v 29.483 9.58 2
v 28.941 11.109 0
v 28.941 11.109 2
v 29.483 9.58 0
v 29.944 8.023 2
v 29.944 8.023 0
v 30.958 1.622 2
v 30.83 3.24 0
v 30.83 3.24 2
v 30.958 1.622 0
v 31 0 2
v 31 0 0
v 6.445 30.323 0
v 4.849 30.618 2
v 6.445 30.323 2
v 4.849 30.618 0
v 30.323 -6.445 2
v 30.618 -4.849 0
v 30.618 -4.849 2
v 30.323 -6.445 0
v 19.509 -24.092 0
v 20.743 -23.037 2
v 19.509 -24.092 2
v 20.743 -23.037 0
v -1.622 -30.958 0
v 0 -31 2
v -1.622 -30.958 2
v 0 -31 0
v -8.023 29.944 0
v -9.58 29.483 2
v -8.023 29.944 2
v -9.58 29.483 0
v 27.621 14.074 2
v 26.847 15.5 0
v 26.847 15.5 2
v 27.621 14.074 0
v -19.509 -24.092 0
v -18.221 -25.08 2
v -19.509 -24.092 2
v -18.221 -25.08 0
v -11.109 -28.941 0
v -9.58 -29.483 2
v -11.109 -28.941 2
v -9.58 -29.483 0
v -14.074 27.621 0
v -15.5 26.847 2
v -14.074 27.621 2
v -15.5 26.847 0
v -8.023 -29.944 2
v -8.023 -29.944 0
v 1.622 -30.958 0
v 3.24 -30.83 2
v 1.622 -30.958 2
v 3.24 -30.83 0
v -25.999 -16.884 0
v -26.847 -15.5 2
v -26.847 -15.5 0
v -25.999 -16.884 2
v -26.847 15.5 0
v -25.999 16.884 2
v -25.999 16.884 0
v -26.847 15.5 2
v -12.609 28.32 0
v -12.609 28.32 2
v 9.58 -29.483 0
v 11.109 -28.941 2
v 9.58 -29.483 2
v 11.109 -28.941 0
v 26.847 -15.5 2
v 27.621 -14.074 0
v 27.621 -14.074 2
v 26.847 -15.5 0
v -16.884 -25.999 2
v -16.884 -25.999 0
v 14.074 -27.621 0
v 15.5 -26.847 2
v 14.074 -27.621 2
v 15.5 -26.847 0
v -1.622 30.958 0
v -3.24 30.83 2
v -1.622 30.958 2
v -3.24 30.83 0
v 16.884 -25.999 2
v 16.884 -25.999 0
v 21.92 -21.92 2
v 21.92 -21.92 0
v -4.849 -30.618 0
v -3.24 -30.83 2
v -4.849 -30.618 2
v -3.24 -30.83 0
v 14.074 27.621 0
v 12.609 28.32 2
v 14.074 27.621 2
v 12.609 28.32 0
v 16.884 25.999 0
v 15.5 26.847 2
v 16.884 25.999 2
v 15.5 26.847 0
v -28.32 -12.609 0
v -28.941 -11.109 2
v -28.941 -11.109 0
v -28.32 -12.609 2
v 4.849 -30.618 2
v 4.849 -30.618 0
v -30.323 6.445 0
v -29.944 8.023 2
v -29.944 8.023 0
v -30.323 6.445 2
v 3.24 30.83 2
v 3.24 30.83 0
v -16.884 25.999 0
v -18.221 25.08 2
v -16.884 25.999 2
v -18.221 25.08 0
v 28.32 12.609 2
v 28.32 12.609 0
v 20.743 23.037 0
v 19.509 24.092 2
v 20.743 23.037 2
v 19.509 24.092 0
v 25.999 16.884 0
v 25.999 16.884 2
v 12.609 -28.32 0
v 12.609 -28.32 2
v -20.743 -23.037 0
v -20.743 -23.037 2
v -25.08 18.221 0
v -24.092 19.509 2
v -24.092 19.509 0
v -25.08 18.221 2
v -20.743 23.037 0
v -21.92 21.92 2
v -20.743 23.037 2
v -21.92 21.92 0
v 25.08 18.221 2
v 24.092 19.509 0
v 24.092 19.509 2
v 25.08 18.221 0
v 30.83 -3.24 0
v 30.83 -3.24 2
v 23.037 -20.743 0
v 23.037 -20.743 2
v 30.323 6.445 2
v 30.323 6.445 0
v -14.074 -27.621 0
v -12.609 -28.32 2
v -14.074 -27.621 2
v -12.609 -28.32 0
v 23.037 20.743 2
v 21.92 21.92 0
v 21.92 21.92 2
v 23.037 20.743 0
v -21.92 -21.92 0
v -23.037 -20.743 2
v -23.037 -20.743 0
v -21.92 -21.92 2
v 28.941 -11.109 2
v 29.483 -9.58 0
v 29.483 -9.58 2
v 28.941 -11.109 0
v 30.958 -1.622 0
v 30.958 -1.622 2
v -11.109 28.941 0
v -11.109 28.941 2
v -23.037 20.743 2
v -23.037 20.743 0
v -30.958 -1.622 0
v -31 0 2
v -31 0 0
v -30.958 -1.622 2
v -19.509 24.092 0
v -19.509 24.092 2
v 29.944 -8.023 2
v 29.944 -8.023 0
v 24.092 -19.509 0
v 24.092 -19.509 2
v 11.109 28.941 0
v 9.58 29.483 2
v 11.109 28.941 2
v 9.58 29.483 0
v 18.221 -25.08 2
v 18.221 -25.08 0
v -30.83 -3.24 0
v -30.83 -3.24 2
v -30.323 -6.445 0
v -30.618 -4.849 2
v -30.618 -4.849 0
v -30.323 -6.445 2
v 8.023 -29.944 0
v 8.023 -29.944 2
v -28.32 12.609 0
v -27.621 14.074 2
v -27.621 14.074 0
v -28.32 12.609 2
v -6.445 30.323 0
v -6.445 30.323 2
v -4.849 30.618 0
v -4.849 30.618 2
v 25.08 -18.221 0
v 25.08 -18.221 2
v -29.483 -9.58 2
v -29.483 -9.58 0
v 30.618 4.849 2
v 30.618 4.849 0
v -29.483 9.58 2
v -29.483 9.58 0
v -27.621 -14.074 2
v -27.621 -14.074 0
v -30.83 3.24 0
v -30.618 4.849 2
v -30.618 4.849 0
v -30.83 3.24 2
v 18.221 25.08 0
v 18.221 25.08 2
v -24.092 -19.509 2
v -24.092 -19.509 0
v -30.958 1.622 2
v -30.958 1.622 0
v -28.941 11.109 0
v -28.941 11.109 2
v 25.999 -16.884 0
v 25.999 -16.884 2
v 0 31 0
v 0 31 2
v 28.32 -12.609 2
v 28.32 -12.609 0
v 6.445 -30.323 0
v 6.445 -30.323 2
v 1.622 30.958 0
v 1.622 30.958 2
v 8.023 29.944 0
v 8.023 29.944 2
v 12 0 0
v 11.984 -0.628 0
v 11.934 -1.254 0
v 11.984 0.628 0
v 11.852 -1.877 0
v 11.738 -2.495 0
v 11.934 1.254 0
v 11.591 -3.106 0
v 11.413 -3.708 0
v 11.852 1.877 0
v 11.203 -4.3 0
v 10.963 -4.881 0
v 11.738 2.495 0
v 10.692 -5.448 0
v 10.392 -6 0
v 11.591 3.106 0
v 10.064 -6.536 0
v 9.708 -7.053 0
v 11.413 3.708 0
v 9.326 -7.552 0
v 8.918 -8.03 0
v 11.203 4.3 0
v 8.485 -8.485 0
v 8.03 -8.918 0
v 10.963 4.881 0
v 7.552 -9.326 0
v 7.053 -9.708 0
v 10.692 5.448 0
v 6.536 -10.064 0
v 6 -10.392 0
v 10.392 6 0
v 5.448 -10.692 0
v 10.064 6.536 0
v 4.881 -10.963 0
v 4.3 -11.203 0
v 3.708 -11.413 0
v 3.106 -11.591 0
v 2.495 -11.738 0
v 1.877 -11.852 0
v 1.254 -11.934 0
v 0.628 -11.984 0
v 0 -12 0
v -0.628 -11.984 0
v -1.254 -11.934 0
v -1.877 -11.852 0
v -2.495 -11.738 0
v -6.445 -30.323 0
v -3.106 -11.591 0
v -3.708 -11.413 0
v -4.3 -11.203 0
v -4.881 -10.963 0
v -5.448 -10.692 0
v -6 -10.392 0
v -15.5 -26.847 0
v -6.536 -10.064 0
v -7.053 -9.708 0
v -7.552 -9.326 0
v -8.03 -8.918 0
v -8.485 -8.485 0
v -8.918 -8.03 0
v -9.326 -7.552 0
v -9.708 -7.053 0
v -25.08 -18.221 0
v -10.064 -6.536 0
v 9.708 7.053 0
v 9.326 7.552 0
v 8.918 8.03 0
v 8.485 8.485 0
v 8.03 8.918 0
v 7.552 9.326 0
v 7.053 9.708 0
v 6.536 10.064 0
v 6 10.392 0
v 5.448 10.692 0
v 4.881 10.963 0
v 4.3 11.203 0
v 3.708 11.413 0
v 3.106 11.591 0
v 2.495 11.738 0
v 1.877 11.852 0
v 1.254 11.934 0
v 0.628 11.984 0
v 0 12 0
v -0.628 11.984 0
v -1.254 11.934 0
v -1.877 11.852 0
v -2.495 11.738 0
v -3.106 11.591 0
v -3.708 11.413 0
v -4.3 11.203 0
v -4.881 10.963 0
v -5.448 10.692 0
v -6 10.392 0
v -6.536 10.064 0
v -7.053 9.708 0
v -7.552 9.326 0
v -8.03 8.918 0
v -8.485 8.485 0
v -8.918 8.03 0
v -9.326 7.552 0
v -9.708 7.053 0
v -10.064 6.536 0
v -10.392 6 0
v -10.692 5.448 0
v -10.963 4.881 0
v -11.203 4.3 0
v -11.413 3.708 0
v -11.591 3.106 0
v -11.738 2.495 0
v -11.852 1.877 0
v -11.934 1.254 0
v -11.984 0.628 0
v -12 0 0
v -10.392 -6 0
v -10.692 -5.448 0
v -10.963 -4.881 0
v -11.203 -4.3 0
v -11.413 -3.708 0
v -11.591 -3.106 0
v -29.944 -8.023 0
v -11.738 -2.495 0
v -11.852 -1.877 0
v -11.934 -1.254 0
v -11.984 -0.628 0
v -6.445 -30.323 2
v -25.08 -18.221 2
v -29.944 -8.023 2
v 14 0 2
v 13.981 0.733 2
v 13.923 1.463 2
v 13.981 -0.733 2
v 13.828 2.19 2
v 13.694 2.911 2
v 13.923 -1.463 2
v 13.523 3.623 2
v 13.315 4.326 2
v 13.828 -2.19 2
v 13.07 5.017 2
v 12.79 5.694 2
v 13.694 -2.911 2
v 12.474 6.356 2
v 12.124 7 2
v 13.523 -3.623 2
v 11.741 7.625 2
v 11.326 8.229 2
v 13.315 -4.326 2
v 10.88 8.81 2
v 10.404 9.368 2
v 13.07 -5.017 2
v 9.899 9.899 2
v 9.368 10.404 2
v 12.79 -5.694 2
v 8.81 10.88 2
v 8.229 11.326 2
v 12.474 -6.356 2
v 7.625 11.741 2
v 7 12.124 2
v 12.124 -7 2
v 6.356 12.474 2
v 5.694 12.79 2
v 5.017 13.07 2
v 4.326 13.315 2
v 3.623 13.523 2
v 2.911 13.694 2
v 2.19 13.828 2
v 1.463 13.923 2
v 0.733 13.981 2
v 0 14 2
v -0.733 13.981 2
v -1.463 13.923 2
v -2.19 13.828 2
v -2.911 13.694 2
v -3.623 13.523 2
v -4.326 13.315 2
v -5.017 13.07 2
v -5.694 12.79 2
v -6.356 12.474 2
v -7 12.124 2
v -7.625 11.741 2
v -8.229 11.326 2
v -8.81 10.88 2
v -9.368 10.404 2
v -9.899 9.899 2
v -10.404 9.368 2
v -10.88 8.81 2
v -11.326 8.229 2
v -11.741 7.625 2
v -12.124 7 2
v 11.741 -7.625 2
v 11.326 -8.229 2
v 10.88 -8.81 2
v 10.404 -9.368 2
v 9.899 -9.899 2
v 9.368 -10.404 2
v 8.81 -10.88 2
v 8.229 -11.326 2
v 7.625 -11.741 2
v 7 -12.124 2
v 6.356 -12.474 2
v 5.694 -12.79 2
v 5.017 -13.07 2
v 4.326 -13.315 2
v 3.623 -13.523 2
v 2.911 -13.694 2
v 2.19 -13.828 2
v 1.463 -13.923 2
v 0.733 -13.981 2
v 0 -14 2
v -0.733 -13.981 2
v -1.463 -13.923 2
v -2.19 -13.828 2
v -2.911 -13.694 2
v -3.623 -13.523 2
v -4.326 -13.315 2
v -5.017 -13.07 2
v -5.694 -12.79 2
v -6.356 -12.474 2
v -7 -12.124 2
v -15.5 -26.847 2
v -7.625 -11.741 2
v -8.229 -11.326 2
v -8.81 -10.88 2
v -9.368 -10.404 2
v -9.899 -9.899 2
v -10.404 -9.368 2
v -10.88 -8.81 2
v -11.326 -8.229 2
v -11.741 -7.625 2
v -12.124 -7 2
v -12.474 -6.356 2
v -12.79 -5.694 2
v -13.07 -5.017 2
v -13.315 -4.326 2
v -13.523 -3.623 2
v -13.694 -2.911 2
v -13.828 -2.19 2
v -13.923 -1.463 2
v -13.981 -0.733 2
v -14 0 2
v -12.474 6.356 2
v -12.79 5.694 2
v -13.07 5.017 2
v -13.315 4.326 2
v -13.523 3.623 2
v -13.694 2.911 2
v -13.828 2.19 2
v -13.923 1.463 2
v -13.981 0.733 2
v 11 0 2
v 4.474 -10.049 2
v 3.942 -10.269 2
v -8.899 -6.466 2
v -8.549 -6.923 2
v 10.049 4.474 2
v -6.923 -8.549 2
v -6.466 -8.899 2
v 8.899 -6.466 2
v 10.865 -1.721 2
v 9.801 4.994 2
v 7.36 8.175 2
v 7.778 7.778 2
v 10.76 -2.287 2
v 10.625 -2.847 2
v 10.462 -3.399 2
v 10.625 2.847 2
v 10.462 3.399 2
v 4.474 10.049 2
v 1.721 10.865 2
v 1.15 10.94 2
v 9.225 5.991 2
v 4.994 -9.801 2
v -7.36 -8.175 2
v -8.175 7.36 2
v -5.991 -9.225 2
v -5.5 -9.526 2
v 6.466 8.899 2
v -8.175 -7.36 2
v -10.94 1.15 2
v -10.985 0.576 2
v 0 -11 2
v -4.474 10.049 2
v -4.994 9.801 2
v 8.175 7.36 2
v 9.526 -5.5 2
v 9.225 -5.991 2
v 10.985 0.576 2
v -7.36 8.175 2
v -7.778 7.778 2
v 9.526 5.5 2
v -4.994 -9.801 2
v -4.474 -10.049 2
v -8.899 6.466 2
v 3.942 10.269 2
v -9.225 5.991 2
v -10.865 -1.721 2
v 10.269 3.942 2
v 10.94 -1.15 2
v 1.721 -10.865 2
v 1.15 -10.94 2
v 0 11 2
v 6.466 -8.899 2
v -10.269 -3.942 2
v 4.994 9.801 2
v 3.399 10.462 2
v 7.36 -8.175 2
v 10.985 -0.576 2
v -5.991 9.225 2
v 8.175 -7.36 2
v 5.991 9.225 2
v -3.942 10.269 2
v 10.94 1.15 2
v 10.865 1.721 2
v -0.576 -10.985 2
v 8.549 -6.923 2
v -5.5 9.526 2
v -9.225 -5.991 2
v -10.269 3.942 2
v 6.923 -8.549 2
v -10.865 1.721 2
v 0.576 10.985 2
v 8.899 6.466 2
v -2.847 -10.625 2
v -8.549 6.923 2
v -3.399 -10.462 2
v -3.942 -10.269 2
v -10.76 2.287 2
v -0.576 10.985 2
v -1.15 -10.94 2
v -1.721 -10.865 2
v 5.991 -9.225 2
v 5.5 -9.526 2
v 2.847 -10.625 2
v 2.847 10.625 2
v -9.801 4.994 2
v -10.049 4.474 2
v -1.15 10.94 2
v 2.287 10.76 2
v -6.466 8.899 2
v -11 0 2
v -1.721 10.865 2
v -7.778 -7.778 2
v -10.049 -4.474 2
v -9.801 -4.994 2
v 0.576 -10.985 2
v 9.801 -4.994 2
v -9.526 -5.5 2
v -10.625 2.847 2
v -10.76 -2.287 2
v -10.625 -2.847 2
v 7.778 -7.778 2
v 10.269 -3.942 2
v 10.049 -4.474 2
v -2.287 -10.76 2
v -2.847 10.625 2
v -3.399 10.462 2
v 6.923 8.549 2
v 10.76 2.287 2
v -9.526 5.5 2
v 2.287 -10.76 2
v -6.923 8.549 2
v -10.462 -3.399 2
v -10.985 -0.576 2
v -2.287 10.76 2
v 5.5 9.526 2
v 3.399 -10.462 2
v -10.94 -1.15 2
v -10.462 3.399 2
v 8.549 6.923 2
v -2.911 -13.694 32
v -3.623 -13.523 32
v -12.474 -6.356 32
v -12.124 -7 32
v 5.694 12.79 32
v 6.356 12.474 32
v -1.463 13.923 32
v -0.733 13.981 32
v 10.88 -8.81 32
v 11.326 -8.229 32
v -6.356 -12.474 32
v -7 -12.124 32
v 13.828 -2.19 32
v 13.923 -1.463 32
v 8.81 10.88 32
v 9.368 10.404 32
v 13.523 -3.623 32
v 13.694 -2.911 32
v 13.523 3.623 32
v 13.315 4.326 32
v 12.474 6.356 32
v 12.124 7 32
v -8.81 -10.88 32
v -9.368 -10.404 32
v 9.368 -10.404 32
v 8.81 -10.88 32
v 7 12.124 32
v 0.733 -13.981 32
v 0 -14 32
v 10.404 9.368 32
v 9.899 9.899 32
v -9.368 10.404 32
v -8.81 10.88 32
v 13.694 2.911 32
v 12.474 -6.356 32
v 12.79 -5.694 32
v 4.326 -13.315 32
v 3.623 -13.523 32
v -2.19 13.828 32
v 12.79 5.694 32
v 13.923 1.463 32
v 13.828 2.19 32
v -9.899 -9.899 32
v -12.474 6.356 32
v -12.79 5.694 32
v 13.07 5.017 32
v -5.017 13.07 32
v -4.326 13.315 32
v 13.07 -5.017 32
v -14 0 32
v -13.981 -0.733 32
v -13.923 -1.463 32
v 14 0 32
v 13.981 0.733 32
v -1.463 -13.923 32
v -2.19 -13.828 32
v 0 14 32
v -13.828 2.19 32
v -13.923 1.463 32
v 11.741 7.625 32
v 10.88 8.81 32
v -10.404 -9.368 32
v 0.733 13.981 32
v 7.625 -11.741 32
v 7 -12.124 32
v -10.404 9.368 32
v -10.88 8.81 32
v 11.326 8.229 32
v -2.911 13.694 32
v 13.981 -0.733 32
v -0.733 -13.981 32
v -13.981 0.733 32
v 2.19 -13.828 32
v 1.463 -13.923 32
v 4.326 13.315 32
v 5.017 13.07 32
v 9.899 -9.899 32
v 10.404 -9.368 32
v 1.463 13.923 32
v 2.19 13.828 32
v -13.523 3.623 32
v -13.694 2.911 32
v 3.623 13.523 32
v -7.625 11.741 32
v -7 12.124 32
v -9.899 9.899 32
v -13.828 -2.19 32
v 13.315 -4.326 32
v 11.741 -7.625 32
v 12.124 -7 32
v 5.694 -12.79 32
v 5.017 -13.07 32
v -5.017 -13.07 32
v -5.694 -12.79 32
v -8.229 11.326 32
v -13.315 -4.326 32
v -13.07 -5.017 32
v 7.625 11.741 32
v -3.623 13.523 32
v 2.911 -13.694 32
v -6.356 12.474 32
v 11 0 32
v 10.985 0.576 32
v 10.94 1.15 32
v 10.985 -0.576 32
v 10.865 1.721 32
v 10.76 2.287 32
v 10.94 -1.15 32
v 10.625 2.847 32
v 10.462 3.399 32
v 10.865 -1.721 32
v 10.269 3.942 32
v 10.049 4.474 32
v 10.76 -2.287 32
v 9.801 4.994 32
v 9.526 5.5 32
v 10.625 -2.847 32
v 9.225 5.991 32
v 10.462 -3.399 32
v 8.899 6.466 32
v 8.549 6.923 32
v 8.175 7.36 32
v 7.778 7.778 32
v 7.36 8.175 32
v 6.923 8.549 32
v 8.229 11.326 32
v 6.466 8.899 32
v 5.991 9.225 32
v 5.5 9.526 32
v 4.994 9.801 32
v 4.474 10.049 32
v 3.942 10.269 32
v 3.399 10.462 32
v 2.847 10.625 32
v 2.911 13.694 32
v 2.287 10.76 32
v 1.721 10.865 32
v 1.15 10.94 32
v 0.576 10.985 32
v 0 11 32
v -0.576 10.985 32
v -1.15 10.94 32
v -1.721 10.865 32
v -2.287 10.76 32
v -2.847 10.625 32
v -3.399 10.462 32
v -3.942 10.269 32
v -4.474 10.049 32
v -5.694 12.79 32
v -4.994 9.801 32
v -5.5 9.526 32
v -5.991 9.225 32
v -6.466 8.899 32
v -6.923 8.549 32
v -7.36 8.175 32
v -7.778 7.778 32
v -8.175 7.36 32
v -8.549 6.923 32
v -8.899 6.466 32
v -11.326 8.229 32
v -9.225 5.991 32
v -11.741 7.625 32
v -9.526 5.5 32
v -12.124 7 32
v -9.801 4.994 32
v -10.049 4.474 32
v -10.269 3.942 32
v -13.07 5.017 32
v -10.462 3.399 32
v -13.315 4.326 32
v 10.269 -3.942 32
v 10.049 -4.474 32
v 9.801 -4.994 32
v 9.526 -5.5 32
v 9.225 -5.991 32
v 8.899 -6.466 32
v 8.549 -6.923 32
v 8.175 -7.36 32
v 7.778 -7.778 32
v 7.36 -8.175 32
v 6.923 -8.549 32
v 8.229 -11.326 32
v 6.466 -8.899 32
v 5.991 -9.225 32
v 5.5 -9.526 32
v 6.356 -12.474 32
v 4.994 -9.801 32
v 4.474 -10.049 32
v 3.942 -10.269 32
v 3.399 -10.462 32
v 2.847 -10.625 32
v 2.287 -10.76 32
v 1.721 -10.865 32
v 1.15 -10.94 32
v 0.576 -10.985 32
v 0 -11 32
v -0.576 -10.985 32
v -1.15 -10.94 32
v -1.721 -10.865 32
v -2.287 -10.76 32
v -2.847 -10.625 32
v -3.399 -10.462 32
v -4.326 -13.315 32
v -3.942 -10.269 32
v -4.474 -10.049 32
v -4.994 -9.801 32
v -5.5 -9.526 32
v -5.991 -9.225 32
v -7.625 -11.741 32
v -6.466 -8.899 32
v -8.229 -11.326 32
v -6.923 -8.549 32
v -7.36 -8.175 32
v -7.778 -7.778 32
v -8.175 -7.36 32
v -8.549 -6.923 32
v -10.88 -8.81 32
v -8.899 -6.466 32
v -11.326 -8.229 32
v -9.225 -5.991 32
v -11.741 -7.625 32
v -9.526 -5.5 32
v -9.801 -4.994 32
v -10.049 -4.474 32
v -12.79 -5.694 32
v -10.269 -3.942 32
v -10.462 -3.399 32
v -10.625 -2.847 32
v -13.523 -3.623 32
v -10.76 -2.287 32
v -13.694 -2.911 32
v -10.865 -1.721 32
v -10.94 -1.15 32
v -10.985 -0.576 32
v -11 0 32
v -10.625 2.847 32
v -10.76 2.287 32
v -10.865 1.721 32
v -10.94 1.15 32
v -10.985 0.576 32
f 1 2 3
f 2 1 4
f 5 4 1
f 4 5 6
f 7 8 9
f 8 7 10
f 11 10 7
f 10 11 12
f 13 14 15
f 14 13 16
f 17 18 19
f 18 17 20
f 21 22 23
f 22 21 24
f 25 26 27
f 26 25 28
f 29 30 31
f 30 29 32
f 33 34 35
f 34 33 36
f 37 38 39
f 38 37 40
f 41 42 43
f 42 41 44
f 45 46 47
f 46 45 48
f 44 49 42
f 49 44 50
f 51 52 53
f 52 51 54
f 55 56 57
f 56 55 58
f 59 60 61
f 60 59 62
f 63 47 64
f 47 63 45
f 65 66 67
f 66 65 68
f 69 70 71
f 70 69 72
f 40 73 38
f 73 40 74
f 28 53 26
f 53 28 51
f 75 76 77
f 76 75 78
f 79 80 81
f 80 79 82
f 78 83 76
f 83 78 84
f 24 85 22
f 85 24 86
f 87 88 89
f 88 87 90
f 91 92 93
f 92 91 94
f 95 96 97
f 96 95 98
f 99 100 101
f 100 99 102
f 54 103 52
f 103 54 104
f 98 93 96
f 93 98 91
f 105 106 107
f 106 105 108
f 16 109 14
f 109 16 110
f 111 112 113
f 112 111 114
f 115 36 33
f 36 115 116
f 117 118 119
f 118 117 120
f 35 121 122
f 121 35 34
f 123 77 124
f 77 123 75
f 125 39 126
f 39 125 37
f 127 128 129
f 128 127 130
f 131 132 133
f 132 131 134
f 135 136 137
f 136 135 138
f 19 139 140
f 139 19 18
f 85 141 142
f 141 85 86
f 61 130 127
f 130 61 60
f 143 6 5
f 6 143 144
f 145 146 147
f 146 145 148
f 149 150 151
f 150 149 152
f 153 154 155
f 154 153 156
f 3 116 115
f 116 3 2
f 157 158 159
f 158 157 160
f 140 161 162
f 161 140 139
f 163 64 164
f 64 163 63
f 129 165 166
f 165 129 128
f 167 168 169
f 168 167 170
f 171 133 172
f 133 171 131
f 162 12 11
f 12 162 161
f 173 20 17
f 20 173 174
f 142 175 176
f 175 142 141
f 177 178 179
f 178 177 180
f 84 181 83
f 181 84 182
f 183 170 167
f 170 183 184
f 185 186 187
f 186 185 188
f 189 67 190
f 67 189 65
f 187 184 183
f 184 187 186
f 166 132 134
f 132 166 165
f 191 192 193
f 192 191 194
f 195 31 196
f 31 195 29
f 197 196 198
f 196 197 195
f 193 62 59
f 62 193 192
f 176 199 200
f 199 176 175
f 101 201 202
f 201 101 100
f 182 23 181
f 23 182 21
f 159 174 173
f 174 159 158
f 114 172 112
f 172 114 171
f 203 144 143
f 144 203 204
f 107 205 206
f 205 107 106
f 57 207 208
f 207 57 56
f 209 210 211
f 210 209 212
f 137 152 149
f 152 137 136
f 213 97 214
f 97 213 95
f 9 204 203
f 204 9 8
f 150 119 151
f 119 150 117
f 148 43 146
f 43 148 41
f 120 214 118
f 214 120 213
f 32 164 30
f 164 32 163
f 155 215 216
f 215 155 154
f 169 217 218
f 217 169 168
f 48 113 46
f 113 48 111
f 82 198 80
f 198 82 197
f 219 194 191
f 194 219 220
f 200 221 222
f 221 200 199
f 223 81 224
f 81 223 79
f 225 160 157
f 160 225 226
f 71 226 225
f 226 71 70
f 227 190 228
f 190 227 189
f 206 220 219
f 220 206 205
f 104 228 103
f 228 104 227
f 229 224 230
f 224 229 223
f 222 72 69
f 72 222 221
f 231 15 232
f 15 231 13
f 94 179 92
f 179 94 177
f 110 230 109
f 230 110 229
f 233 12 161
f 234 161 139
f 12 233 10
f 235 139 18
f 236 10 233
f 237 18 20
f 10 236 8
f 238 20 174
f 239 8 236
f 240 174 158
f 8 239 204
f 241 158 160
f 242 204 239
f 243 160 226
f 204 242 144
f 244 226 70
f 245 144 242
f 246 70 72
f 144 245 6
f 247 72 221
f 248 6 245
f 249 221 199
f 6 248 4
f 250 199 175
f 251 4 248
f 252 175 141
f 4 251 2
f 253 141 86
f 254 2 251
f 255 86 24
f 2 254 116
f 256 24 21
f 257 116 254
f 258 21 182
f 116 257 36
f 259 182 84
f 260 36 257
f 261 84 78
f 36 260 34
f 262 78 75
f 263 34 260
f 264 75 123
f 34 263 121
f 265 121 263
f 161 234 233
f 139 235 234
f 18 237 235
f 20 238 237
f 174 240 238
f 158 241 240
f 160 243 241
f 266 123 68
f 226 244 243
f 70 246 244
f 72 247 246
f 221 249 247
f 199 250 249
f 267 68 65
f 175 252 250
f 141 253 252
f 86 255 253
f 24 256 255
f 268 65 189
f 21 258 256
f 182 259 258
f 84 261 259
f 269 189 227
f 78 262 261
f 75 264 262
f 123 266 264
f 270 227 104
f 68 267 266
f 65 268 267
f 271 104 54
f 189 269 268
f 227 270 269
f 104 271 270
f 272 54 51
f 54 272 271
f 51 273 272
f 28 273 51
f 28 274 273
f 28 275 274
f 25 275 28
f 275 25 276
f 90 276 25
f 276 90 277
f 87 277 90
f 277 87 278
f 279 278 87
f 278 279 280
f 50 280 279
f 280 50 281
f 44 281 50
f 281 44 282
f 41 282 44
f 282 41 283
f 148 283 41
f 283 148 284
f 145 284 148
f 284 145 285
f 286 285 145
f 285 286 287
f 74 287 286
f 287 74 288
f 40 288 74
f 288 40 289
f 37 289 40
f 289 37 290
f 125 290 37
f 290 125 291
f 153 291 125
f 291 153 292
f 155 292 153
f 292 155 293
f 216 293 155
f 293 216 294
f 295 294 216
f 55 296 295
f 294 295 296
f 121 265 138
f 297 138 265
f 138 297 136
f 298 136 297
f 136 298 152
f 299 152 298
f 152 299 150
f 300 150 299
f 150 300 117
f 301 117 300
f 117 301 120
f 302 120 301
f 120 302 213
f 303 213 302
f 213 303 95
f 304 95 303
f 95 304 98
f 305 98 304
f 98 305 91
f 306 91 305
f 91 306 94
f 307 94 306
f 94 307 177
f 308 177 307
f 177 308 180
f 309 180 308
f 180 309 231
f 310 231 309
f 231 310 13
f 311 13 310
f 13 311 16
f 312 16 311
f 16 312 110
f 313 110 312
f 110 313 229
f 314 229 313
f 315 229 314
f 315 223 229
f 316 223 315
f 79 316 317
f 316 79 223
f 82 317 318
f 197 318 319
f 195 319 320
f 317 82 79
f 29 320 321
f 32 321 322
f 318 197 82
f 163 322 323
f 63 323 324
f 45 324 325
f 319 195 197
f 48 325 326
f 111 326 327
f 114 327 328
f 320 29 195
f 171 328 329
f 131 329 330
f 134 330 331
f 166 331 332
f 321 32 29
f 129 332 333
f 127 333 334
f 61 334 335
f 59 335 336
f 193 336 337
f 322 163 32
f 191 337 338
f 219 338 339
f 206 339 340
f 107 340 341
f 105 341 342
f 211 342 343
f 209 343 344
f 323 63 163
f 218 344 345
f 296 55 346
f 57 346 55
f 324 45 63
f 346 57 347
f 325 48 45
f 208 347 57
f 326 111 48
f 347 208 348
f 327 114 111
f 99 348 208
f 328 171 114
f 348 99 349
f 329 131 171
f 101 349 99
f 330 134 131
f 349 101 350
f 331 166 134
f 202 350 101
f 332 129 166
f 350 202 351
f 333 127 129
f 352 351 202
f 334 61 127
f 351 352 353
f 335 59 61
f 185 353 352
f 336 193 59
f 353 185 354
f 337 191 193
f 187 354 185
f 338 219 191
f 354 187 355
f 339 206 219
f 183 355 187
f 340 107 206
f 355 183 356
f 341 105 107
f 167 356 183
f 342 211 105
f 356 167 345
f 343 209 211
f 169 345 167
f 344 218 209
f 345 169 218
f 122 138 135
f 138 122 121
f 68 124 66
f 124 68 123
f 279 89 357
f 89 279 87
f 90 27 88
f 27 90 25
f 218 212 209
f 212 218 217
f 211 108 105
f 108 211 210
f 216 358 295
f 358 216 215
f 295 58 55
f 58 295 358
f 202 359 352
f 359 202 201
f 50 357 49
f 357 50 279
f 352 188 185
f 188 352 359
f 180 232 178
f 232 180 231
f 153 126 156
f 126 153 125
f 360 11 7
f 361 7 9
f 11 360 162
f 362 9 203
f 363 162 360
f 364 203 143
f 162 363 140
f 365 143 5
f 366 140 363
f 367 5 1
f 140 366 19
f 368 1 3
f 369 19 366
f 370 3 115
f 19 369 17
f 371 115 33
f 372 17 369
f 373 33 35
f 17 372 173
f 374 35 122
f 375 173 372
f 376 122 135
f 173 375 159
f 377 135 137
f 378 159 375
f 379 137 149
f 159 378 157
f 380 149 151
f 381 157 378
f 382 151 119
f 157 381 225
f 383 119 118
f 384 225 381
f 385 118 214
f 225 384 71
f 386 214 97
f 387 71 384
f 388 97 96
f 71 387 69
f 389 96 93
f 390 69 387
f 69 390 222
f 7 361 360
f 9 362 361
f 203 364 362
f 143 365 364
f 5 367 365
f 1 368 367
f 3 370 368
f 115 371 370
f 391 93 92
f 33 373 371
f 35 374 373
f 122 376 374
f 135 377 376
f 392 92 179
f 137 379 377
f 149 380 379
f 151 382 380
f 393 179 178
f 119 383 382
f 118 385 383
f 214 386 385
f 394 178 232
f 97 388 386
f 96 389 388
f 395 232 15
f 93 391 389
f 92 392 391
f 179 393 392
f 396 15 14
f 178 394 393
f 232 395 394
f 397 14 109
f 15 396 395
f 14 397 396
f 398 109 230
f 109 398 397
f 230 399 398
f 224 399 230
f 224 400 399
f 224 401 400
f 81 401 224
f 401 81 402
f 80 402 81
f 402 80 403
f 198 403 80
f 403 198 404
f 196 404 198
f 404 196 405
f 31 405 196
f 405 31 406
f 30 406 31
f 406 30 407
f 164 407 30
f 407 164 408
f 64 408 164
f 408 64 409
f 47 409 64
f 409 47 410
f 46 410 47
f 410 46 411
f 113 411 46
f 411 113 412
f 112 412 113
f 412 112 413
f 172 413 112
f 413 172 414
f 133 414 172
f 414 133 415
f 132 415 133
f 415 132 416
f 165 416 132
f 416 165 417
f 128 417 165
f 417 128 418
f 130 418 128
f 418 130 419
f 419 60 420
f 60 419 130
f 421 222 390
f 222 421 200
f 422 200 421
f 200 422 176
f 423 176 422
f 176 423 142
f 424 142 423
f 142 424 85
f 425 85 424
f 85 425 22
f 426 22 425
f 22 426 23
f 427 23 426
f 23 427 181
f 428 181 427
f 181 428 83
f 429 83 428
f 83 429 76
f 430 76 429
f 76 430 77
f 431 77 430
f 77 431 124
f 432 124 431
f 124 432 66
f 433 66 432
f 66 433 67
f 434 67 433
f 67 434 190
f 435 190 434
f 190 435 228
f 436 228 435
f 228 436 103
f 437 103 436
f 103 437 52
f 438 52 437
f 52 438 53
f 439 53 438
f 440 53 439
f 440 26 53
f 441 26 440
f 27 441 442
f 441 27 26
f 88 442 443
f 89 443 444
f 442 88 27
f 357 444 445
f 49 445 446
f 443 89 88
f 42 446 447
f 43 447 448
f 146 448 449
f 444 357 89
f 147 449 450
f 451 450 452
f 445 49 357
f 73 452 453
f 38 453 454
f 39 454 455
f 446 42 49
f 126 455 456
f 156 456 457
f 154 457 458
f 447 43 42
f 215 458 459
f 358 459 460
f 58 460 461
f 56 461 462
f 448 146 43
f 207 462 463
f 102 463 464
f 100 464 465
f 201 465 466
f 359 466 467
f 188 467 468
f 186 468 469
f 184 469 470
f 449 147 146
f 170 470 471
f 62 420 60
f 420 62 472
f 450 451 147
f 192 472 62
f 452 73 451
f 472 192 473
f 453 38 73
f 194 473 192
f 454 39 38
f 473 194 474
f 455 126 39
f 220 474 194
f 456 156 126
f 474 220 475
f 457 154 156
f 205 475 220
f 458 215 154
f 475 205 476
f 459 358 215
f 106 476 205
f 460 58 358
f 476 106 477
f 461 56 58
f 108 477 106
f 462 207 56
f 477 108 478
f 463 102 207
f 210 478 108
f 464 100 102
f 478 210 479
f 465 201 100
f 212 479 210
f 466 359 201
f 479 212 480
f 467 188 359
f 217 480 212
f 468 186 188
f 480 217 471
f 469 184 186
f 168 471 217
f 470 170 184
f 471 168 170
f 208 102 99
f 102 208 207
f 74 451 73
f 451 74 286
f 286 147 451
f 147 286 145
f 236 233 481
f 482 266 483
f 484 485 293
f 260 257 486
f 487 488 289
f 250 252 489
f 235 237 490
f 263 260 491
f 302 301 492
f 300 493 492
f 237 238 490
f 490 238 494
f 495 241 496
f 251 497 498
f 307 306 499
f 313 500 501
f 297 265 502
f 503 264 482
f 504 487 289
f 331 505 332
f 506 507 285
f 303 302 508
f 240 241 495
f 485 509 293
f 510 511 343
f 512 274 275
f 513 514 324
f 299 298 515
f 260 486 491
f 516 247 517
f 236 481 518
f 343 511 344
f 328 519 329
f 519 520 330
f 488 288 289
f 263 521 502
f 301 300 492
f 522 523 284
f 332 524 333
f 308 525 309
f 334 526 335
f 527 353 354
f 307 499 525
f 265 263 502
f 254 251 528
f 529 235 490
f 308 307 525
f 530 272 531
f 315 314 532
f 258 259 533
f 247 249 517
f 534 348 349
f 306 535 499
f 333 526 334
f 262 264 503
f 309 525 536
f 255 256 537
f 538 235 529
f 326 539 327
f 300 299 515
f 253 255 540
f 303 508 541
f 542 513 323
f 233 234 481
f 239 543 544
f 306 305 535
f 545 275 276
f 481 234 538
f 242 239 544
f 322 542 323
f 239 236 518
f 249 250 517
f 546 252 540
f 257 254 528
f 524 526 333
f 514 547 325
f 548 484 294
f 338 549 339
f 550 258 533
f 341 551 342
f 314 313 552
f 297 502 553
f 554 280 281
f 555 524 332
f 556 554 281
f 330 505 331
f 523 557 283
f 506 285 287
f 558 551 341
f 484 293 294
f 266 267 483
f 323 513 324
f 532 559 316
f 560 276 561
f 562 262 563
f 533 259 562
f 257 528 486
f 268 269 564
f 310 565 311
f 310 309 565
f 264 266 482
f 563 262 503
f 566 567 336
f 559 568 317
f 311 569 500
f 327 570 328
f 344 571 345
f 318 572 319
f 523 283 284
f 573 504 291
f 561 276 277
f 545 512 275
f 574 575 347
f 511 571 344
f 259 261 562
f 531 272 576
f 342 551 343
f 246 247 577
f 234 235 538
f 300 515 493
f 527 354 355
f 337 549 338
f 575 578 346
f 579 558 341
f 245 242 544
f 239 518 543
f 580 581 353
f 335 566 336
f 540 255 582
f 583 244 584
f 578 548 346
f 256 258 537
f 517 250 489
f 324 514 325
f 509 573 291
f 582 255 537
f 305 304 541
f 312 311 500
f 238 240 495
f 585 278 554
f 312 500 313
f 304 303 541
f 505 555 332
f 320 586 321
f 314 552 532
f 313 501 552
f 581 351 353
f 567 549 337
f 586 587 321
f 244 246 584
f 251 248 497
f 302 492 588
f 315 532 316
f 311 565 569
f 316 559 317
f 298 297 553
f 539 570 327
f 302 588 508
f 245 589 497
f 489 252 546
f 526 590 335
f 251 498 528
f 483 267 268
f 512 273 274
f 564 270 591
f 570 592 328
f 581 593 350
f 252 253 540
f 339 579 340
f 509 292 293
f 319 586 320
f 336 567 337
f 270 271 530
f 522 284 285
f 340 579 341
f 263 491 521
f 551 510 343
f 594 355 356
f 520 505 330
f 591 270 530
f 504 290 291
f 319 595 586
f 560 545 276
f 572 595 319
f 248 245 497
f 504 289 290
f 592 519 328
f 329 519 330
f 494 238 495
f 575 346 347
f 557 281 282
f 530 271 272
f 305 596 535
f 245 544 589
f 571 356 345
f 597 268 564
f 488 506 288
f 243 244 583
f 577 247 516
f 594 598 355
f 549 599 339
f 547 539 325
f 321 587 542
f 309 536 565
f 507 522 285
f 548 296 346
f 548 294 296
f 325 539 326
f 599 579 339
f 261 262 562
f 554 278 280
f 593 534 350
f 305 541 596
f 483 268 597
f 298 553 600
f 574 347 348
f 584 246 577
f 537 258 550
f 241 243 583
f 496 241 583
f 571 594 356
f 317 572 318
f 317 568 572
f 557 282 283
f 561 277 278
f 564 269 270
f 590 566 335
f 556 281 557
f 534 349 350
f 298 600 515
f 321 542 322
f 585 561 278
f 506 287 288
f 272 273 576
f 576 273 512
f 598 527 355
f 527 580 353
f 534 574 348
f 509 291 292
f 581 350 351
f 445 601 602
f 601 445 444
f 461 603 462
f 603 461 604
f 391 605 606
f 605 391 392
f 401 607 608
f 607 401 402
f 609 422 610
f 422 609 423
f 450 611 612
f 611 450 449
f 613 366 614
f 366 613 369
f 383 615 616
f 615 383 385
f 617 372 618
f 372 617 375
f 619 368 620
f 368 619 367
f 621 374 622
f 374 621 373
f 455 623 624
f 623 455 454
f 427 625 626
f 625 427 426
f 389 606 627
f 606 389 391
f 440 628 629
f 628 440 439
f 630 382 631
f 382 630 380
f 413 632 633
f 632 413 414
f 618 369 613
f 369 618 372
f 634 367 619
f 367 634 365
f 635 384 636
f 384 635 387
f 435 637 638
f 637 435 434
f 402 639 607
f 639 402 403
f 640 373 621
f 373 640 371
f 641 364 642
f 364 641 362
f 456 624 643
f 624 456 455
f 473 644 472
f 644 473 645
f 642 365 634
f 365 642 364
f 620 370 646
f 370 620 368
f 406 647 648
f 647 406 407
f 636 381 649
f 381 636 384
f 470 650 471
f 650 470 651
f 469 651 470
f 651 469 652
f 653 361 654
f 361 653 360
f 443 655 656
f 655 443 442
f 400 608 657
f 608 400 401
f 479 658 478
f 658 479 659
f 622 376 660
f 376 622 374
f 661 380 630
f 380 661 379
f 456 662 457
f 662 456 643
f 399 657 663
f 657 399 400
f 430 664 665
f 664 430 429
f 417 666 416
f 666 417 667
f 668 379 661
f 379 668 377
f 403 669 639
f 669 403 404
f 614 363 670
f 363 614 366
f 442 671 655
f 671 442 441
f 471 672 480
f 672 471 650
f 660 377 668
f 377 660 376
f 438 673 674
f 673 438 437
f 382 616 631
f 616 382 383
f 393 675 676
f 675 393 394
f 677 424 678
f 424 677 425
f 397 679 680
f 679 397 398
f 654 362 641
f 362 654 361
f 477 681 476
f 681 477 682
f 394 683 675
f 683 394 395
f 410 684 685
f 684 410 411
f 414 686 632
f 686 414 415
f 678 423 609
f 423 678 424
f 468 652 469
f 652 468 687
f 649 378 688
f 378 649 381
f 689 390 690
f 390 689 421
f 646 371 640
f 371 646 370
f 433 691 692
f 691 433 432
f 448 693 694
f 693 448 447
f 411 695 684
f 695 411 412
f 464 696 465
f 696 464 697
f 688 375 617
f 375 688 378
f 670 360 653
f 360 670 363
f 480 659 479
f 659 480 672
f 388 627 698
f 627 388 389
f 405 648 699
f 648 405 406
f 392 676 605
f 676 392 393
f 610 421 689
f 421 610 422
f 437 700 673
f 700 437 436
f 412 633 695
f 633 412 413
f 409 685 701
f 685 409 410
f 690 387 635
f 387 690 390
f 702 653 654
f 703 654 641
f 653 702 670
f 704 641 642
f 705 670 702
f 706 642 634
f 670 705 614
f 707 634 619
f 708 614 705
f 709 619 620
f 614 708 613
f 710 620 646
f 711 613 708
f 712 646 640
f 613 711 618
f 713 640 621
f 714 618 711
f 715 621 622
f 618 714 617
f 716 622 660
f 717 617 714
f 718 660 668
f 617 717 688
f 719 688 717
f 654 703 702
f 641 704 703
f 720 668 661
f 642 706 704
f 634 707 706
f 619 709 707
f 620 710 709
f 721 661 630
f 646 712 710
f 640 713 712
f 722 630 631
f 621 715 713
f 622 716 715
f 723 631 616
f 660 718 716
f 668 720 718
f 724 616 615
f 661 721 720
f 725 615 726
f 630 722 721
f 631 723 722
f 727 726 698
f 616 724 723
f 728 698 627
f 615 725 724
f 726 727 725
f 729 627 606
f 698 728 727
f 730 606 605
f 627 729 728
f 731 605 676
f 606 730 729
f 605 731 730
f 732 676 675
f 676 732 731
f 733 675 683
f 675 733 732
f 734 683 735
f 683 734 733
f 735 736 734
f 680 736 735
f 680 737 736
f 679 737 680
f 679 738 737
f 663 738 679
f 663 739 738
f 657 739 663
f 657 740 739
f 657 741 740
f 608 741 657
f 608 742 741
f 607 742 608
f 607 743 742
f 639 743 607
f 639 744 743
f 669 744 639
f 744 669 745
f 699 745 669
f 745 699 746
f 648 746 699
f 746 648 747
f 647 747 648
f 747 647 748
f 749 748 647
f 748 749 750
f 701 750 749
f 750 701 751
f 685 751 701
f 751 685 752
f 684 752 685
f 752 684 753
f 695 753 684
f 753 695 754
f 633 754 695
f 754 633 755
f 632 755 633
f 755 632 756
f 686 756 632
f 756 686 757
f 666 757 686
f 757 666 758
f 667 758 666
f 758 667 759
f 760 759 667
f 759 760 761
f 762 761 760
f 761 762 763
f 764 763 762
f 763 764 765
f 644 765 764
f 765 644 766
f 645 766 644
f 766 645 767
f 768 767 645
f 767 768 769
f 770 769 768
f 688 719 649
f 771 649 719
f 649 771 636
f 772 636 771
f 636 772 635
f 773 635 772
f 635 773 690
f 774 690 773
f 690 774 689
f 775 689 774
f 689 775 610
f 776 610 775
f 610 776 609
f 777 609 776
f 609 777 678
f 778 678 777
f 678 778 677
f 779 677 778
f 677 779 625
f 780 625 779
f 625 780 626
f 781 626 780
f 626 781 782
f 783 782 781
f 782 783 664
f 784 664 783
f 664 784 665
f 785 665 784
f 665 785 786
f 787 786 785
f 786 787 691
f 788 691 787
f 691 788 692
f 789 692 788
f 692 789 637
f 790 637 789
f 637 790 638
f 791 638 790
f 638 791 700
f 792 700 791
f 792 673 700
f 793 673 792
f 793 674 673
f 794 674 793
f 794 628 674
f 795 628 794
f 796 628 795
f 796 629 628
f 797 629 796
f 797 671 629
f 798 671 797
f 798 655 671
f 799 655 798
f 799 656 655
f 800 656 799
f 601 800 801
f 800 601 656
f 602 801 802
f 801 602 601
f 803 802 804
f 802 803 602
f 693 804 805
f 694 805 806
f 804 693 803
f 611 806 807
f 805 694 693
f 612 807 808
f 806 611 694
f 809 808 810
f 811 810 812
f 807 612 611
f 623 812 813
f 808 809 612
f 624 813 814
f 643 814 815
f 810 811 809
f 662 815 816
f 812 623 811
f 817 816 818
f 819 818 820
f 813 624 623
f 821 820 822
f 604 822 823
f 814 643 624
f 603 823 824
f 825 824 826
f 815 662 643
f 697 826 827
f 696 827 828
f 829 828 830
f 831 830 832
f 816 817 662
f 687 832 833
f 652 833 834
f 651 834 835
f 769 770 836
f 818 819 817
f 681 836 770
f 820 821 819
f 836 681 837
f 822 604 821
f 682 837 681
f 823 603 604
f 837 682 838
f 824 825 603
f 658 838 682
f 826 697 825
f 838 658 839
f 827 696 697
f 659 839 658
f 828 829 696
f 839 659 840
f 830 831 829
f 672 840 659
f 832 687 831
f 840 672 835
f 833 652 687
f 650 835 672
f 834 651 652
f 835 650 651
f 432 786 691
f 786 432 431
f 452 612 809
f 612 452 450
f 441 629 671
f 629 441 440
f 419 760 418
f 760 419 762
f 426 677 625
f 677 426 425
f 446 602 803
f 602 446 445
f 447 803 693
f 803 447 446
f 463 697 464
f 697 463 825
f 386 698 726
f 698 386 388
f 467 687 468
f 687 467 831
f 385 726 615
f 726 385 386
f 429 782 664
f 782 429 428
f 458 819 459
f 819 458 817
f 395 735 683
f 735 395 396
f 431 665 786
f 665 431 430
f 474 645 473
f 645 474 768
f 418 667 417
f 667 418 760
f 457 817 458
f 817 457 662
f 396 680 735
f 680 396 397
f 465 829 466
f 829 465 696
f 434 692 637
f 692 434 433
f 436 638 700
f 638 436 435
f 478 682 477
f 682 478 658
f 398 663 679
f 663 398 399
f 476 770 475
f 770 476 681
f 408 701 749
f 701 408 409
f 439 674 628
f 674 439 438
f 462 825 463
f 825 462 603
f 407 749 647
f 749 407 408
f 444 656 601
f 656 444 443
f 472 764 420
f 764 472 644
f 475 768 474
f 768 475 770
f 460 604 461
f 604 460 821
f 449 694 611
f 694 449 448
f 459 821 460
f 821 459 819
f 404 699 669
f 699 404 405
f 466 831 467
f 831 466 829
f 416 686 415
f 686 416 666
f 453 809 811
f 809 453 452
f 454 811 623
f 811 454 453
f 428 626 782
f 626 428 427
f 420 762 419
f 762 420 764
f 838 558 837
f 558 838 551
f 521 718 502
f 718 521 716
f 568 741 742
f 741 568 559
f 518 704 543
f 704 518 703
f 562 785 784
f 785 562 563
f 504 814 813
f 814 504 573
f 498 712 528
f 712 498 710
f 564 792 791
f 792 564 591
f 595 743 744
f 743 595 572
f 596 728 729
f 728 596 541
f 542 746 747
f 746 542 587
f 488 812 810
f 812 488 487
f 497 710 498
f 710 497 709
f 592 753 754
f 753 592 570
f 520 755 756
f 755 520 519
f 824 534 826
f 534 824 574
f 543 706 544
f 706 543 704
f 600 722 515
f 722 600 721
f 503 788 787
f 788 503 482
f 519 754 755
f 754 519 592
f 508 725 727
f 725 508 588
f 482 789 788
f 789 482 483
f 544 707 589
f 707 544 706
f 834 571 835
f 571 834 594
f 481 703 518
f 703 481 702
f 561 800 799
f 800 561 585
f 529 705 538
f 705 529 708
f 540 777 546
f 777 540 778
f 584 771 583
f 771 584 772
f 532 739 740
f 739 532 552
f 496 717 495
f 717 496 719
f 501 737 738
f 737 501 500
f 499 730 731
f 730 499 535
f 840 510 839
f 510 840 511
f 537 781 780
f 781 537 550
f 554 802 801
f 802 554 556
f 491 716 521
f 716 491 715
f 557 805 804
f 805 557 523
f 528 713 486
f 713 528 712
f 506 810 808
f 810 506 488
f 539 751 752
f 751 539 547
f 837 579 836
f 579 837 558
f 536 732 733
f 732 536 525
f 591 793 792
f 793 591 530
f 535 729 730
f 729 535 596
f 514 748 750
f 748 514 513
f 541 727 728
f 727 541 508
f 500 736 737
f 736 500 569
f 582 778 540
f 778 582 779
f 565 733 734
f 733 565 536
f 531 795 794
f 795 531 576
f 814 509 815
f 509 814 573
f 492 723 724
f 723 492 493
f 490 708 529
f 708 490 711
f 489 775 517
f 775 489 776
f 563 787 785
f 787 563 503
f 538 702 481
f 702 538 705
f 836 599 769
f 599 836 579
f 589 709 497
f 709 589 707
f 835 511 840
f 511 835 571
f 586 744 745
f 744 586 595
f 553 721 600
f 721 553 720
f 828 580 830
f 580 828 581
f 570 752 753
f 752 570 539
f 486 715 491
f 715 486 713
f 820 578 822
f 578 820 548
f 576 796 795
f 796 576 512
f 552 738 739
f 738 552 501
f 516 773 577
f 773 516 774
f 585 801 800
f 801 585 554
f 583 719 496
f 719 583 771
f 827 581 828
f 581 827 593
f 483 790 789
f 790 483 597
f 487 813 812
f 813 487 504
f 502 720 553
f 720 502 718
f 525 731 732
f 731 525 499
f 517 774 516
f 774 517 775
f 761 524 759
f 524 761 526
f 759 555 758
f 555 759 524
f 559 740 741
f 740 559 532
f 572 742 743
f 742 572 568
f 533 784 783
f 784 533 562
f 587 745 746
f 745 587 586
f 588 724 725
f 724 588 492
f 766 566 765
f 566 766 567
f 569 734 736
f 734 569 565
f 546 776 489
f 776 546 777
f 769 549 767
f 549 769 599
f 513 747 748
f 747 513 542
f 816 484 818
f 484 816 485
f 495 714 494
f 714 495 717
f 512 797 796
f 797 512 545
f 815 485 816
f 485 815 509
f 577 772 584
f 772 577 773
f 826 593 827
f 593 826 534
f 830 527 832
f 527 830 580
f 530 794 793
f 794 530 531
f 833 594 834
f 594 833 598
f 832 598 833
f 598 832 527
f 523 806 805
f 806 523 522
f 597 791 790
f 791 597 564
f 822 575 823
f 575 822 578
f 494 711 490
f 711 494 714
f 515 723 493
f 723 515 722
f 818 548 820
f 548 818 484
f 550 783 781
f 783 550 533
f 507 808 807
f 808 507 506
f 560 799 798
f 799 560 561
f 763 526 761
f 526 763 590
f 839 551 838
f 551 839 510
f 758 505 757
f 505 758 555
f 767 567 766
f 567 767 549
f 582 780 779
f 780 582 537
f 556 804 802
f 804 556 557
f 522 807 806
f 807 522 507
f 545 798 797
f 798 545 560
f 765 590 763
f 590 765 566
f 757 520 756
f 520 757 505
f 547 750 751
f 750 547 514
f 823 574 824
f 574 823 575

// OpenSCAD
$fn = 120;

// =============================
// Dimensions for the upper hollow cylinder
// =============================
outer_d = 28;            // enlarged +1mm
wall    = 3;
inner_d = outer_d - 2*wall;   // = 19.5 mm
inner_h = 30;

// =============================
// CHAMFER parameters
// =============================
chamfer_depth = 2;      
chamfer_extra = 2;      

// =============================
// FIRST SLIT parameters
// =============================
slit_angle      = 45;    
slit_radius     = 27;    
slit_length     = 12;    
slit_width      = 1;     
slit_tilt       = 80;    

// =============================
// SECOND SLIT parameters
// =============================
slit2_angle_offset = 0;
slit2_radius       = 25;
slit2_length       = 15;
slit2_width        = 1.5;
slit2_tilt         = 290;


// =============================
// BASE DISK WITH HOLE, CHAMFER, AND 3 SLIT PAIRS
// =============================
difference() {

    // Base disk (larger by 1mm)
    cylinder(d = 62, h = 2);

    // Straight portion of the center hole
    cylinder(d = inner_d, h = 2 + 0.2);

    // Chamfer
    cylinder(
        h  = chamfer_depth,
        d1 = inner_d + chamfer_extra,
        d2 = inner_d
    );

    // ---- 3 PAIRS OF SLITS ----
    for (i = [0:2]) {

        // FIRST SLIT
        rotate([0,0, slit_angle + 120*i]) {
            translate([slit_radius, 0, 0]) {
                rotate([0,0, slit_tilt]) {
                    polyhedron(
                        points=[
                            [0,0,0],
                            [slit_length, slit_width/2, 0],
                            [slit_length,-slit_width/2,0],

                            [0,0,2],
                            [slit_length, slit_width/2, 2],
                            [slit_length,-slit_width/2,2]
                        ],
                        faces=[
                            [0,1,2],
                            [3,4,5],
                            [0,3,4,1],
                            [1,4,5,2],
                            [2,5,3,0]
                        ]
                    );
                }
            }
        }

        // SECOND SLIT
        rotate([0,0, slit_angle + slit2_angle_offset + 120*i]) {
            translate([slit2_radius, 0, 0]) {
                rotate([0,0, slit2_tilt]) {
                    polyhedron(
                        points=[
                            [0,0,0],
                            [slit2_length, slit2_width/2, 0],
                            [slit2_length,-slit2_width/2,0],

                            [0,0,2],
                            [slit2_length, slit2_width/2, 2],
                            [slit2_length,-slit2_width/2,2]
                        ],
                        faces=[
                            [0,1,2],
                            [3,4,5],
                            [0,3,4,1],
                            [1,4,5,2],
                            [2,5,3,0]
                        ]
                    );
                }
            }
        }

    } // end loop
}


// =============================
// UPPER HOLLOW CYLINDER
// =============================
translate([0,0,2]) {
    difference() {
        cylinder(d = outer_d, h = inner_h);
        cylinder(d = inner_d, h = inner_h + 0.2);
    }
}
